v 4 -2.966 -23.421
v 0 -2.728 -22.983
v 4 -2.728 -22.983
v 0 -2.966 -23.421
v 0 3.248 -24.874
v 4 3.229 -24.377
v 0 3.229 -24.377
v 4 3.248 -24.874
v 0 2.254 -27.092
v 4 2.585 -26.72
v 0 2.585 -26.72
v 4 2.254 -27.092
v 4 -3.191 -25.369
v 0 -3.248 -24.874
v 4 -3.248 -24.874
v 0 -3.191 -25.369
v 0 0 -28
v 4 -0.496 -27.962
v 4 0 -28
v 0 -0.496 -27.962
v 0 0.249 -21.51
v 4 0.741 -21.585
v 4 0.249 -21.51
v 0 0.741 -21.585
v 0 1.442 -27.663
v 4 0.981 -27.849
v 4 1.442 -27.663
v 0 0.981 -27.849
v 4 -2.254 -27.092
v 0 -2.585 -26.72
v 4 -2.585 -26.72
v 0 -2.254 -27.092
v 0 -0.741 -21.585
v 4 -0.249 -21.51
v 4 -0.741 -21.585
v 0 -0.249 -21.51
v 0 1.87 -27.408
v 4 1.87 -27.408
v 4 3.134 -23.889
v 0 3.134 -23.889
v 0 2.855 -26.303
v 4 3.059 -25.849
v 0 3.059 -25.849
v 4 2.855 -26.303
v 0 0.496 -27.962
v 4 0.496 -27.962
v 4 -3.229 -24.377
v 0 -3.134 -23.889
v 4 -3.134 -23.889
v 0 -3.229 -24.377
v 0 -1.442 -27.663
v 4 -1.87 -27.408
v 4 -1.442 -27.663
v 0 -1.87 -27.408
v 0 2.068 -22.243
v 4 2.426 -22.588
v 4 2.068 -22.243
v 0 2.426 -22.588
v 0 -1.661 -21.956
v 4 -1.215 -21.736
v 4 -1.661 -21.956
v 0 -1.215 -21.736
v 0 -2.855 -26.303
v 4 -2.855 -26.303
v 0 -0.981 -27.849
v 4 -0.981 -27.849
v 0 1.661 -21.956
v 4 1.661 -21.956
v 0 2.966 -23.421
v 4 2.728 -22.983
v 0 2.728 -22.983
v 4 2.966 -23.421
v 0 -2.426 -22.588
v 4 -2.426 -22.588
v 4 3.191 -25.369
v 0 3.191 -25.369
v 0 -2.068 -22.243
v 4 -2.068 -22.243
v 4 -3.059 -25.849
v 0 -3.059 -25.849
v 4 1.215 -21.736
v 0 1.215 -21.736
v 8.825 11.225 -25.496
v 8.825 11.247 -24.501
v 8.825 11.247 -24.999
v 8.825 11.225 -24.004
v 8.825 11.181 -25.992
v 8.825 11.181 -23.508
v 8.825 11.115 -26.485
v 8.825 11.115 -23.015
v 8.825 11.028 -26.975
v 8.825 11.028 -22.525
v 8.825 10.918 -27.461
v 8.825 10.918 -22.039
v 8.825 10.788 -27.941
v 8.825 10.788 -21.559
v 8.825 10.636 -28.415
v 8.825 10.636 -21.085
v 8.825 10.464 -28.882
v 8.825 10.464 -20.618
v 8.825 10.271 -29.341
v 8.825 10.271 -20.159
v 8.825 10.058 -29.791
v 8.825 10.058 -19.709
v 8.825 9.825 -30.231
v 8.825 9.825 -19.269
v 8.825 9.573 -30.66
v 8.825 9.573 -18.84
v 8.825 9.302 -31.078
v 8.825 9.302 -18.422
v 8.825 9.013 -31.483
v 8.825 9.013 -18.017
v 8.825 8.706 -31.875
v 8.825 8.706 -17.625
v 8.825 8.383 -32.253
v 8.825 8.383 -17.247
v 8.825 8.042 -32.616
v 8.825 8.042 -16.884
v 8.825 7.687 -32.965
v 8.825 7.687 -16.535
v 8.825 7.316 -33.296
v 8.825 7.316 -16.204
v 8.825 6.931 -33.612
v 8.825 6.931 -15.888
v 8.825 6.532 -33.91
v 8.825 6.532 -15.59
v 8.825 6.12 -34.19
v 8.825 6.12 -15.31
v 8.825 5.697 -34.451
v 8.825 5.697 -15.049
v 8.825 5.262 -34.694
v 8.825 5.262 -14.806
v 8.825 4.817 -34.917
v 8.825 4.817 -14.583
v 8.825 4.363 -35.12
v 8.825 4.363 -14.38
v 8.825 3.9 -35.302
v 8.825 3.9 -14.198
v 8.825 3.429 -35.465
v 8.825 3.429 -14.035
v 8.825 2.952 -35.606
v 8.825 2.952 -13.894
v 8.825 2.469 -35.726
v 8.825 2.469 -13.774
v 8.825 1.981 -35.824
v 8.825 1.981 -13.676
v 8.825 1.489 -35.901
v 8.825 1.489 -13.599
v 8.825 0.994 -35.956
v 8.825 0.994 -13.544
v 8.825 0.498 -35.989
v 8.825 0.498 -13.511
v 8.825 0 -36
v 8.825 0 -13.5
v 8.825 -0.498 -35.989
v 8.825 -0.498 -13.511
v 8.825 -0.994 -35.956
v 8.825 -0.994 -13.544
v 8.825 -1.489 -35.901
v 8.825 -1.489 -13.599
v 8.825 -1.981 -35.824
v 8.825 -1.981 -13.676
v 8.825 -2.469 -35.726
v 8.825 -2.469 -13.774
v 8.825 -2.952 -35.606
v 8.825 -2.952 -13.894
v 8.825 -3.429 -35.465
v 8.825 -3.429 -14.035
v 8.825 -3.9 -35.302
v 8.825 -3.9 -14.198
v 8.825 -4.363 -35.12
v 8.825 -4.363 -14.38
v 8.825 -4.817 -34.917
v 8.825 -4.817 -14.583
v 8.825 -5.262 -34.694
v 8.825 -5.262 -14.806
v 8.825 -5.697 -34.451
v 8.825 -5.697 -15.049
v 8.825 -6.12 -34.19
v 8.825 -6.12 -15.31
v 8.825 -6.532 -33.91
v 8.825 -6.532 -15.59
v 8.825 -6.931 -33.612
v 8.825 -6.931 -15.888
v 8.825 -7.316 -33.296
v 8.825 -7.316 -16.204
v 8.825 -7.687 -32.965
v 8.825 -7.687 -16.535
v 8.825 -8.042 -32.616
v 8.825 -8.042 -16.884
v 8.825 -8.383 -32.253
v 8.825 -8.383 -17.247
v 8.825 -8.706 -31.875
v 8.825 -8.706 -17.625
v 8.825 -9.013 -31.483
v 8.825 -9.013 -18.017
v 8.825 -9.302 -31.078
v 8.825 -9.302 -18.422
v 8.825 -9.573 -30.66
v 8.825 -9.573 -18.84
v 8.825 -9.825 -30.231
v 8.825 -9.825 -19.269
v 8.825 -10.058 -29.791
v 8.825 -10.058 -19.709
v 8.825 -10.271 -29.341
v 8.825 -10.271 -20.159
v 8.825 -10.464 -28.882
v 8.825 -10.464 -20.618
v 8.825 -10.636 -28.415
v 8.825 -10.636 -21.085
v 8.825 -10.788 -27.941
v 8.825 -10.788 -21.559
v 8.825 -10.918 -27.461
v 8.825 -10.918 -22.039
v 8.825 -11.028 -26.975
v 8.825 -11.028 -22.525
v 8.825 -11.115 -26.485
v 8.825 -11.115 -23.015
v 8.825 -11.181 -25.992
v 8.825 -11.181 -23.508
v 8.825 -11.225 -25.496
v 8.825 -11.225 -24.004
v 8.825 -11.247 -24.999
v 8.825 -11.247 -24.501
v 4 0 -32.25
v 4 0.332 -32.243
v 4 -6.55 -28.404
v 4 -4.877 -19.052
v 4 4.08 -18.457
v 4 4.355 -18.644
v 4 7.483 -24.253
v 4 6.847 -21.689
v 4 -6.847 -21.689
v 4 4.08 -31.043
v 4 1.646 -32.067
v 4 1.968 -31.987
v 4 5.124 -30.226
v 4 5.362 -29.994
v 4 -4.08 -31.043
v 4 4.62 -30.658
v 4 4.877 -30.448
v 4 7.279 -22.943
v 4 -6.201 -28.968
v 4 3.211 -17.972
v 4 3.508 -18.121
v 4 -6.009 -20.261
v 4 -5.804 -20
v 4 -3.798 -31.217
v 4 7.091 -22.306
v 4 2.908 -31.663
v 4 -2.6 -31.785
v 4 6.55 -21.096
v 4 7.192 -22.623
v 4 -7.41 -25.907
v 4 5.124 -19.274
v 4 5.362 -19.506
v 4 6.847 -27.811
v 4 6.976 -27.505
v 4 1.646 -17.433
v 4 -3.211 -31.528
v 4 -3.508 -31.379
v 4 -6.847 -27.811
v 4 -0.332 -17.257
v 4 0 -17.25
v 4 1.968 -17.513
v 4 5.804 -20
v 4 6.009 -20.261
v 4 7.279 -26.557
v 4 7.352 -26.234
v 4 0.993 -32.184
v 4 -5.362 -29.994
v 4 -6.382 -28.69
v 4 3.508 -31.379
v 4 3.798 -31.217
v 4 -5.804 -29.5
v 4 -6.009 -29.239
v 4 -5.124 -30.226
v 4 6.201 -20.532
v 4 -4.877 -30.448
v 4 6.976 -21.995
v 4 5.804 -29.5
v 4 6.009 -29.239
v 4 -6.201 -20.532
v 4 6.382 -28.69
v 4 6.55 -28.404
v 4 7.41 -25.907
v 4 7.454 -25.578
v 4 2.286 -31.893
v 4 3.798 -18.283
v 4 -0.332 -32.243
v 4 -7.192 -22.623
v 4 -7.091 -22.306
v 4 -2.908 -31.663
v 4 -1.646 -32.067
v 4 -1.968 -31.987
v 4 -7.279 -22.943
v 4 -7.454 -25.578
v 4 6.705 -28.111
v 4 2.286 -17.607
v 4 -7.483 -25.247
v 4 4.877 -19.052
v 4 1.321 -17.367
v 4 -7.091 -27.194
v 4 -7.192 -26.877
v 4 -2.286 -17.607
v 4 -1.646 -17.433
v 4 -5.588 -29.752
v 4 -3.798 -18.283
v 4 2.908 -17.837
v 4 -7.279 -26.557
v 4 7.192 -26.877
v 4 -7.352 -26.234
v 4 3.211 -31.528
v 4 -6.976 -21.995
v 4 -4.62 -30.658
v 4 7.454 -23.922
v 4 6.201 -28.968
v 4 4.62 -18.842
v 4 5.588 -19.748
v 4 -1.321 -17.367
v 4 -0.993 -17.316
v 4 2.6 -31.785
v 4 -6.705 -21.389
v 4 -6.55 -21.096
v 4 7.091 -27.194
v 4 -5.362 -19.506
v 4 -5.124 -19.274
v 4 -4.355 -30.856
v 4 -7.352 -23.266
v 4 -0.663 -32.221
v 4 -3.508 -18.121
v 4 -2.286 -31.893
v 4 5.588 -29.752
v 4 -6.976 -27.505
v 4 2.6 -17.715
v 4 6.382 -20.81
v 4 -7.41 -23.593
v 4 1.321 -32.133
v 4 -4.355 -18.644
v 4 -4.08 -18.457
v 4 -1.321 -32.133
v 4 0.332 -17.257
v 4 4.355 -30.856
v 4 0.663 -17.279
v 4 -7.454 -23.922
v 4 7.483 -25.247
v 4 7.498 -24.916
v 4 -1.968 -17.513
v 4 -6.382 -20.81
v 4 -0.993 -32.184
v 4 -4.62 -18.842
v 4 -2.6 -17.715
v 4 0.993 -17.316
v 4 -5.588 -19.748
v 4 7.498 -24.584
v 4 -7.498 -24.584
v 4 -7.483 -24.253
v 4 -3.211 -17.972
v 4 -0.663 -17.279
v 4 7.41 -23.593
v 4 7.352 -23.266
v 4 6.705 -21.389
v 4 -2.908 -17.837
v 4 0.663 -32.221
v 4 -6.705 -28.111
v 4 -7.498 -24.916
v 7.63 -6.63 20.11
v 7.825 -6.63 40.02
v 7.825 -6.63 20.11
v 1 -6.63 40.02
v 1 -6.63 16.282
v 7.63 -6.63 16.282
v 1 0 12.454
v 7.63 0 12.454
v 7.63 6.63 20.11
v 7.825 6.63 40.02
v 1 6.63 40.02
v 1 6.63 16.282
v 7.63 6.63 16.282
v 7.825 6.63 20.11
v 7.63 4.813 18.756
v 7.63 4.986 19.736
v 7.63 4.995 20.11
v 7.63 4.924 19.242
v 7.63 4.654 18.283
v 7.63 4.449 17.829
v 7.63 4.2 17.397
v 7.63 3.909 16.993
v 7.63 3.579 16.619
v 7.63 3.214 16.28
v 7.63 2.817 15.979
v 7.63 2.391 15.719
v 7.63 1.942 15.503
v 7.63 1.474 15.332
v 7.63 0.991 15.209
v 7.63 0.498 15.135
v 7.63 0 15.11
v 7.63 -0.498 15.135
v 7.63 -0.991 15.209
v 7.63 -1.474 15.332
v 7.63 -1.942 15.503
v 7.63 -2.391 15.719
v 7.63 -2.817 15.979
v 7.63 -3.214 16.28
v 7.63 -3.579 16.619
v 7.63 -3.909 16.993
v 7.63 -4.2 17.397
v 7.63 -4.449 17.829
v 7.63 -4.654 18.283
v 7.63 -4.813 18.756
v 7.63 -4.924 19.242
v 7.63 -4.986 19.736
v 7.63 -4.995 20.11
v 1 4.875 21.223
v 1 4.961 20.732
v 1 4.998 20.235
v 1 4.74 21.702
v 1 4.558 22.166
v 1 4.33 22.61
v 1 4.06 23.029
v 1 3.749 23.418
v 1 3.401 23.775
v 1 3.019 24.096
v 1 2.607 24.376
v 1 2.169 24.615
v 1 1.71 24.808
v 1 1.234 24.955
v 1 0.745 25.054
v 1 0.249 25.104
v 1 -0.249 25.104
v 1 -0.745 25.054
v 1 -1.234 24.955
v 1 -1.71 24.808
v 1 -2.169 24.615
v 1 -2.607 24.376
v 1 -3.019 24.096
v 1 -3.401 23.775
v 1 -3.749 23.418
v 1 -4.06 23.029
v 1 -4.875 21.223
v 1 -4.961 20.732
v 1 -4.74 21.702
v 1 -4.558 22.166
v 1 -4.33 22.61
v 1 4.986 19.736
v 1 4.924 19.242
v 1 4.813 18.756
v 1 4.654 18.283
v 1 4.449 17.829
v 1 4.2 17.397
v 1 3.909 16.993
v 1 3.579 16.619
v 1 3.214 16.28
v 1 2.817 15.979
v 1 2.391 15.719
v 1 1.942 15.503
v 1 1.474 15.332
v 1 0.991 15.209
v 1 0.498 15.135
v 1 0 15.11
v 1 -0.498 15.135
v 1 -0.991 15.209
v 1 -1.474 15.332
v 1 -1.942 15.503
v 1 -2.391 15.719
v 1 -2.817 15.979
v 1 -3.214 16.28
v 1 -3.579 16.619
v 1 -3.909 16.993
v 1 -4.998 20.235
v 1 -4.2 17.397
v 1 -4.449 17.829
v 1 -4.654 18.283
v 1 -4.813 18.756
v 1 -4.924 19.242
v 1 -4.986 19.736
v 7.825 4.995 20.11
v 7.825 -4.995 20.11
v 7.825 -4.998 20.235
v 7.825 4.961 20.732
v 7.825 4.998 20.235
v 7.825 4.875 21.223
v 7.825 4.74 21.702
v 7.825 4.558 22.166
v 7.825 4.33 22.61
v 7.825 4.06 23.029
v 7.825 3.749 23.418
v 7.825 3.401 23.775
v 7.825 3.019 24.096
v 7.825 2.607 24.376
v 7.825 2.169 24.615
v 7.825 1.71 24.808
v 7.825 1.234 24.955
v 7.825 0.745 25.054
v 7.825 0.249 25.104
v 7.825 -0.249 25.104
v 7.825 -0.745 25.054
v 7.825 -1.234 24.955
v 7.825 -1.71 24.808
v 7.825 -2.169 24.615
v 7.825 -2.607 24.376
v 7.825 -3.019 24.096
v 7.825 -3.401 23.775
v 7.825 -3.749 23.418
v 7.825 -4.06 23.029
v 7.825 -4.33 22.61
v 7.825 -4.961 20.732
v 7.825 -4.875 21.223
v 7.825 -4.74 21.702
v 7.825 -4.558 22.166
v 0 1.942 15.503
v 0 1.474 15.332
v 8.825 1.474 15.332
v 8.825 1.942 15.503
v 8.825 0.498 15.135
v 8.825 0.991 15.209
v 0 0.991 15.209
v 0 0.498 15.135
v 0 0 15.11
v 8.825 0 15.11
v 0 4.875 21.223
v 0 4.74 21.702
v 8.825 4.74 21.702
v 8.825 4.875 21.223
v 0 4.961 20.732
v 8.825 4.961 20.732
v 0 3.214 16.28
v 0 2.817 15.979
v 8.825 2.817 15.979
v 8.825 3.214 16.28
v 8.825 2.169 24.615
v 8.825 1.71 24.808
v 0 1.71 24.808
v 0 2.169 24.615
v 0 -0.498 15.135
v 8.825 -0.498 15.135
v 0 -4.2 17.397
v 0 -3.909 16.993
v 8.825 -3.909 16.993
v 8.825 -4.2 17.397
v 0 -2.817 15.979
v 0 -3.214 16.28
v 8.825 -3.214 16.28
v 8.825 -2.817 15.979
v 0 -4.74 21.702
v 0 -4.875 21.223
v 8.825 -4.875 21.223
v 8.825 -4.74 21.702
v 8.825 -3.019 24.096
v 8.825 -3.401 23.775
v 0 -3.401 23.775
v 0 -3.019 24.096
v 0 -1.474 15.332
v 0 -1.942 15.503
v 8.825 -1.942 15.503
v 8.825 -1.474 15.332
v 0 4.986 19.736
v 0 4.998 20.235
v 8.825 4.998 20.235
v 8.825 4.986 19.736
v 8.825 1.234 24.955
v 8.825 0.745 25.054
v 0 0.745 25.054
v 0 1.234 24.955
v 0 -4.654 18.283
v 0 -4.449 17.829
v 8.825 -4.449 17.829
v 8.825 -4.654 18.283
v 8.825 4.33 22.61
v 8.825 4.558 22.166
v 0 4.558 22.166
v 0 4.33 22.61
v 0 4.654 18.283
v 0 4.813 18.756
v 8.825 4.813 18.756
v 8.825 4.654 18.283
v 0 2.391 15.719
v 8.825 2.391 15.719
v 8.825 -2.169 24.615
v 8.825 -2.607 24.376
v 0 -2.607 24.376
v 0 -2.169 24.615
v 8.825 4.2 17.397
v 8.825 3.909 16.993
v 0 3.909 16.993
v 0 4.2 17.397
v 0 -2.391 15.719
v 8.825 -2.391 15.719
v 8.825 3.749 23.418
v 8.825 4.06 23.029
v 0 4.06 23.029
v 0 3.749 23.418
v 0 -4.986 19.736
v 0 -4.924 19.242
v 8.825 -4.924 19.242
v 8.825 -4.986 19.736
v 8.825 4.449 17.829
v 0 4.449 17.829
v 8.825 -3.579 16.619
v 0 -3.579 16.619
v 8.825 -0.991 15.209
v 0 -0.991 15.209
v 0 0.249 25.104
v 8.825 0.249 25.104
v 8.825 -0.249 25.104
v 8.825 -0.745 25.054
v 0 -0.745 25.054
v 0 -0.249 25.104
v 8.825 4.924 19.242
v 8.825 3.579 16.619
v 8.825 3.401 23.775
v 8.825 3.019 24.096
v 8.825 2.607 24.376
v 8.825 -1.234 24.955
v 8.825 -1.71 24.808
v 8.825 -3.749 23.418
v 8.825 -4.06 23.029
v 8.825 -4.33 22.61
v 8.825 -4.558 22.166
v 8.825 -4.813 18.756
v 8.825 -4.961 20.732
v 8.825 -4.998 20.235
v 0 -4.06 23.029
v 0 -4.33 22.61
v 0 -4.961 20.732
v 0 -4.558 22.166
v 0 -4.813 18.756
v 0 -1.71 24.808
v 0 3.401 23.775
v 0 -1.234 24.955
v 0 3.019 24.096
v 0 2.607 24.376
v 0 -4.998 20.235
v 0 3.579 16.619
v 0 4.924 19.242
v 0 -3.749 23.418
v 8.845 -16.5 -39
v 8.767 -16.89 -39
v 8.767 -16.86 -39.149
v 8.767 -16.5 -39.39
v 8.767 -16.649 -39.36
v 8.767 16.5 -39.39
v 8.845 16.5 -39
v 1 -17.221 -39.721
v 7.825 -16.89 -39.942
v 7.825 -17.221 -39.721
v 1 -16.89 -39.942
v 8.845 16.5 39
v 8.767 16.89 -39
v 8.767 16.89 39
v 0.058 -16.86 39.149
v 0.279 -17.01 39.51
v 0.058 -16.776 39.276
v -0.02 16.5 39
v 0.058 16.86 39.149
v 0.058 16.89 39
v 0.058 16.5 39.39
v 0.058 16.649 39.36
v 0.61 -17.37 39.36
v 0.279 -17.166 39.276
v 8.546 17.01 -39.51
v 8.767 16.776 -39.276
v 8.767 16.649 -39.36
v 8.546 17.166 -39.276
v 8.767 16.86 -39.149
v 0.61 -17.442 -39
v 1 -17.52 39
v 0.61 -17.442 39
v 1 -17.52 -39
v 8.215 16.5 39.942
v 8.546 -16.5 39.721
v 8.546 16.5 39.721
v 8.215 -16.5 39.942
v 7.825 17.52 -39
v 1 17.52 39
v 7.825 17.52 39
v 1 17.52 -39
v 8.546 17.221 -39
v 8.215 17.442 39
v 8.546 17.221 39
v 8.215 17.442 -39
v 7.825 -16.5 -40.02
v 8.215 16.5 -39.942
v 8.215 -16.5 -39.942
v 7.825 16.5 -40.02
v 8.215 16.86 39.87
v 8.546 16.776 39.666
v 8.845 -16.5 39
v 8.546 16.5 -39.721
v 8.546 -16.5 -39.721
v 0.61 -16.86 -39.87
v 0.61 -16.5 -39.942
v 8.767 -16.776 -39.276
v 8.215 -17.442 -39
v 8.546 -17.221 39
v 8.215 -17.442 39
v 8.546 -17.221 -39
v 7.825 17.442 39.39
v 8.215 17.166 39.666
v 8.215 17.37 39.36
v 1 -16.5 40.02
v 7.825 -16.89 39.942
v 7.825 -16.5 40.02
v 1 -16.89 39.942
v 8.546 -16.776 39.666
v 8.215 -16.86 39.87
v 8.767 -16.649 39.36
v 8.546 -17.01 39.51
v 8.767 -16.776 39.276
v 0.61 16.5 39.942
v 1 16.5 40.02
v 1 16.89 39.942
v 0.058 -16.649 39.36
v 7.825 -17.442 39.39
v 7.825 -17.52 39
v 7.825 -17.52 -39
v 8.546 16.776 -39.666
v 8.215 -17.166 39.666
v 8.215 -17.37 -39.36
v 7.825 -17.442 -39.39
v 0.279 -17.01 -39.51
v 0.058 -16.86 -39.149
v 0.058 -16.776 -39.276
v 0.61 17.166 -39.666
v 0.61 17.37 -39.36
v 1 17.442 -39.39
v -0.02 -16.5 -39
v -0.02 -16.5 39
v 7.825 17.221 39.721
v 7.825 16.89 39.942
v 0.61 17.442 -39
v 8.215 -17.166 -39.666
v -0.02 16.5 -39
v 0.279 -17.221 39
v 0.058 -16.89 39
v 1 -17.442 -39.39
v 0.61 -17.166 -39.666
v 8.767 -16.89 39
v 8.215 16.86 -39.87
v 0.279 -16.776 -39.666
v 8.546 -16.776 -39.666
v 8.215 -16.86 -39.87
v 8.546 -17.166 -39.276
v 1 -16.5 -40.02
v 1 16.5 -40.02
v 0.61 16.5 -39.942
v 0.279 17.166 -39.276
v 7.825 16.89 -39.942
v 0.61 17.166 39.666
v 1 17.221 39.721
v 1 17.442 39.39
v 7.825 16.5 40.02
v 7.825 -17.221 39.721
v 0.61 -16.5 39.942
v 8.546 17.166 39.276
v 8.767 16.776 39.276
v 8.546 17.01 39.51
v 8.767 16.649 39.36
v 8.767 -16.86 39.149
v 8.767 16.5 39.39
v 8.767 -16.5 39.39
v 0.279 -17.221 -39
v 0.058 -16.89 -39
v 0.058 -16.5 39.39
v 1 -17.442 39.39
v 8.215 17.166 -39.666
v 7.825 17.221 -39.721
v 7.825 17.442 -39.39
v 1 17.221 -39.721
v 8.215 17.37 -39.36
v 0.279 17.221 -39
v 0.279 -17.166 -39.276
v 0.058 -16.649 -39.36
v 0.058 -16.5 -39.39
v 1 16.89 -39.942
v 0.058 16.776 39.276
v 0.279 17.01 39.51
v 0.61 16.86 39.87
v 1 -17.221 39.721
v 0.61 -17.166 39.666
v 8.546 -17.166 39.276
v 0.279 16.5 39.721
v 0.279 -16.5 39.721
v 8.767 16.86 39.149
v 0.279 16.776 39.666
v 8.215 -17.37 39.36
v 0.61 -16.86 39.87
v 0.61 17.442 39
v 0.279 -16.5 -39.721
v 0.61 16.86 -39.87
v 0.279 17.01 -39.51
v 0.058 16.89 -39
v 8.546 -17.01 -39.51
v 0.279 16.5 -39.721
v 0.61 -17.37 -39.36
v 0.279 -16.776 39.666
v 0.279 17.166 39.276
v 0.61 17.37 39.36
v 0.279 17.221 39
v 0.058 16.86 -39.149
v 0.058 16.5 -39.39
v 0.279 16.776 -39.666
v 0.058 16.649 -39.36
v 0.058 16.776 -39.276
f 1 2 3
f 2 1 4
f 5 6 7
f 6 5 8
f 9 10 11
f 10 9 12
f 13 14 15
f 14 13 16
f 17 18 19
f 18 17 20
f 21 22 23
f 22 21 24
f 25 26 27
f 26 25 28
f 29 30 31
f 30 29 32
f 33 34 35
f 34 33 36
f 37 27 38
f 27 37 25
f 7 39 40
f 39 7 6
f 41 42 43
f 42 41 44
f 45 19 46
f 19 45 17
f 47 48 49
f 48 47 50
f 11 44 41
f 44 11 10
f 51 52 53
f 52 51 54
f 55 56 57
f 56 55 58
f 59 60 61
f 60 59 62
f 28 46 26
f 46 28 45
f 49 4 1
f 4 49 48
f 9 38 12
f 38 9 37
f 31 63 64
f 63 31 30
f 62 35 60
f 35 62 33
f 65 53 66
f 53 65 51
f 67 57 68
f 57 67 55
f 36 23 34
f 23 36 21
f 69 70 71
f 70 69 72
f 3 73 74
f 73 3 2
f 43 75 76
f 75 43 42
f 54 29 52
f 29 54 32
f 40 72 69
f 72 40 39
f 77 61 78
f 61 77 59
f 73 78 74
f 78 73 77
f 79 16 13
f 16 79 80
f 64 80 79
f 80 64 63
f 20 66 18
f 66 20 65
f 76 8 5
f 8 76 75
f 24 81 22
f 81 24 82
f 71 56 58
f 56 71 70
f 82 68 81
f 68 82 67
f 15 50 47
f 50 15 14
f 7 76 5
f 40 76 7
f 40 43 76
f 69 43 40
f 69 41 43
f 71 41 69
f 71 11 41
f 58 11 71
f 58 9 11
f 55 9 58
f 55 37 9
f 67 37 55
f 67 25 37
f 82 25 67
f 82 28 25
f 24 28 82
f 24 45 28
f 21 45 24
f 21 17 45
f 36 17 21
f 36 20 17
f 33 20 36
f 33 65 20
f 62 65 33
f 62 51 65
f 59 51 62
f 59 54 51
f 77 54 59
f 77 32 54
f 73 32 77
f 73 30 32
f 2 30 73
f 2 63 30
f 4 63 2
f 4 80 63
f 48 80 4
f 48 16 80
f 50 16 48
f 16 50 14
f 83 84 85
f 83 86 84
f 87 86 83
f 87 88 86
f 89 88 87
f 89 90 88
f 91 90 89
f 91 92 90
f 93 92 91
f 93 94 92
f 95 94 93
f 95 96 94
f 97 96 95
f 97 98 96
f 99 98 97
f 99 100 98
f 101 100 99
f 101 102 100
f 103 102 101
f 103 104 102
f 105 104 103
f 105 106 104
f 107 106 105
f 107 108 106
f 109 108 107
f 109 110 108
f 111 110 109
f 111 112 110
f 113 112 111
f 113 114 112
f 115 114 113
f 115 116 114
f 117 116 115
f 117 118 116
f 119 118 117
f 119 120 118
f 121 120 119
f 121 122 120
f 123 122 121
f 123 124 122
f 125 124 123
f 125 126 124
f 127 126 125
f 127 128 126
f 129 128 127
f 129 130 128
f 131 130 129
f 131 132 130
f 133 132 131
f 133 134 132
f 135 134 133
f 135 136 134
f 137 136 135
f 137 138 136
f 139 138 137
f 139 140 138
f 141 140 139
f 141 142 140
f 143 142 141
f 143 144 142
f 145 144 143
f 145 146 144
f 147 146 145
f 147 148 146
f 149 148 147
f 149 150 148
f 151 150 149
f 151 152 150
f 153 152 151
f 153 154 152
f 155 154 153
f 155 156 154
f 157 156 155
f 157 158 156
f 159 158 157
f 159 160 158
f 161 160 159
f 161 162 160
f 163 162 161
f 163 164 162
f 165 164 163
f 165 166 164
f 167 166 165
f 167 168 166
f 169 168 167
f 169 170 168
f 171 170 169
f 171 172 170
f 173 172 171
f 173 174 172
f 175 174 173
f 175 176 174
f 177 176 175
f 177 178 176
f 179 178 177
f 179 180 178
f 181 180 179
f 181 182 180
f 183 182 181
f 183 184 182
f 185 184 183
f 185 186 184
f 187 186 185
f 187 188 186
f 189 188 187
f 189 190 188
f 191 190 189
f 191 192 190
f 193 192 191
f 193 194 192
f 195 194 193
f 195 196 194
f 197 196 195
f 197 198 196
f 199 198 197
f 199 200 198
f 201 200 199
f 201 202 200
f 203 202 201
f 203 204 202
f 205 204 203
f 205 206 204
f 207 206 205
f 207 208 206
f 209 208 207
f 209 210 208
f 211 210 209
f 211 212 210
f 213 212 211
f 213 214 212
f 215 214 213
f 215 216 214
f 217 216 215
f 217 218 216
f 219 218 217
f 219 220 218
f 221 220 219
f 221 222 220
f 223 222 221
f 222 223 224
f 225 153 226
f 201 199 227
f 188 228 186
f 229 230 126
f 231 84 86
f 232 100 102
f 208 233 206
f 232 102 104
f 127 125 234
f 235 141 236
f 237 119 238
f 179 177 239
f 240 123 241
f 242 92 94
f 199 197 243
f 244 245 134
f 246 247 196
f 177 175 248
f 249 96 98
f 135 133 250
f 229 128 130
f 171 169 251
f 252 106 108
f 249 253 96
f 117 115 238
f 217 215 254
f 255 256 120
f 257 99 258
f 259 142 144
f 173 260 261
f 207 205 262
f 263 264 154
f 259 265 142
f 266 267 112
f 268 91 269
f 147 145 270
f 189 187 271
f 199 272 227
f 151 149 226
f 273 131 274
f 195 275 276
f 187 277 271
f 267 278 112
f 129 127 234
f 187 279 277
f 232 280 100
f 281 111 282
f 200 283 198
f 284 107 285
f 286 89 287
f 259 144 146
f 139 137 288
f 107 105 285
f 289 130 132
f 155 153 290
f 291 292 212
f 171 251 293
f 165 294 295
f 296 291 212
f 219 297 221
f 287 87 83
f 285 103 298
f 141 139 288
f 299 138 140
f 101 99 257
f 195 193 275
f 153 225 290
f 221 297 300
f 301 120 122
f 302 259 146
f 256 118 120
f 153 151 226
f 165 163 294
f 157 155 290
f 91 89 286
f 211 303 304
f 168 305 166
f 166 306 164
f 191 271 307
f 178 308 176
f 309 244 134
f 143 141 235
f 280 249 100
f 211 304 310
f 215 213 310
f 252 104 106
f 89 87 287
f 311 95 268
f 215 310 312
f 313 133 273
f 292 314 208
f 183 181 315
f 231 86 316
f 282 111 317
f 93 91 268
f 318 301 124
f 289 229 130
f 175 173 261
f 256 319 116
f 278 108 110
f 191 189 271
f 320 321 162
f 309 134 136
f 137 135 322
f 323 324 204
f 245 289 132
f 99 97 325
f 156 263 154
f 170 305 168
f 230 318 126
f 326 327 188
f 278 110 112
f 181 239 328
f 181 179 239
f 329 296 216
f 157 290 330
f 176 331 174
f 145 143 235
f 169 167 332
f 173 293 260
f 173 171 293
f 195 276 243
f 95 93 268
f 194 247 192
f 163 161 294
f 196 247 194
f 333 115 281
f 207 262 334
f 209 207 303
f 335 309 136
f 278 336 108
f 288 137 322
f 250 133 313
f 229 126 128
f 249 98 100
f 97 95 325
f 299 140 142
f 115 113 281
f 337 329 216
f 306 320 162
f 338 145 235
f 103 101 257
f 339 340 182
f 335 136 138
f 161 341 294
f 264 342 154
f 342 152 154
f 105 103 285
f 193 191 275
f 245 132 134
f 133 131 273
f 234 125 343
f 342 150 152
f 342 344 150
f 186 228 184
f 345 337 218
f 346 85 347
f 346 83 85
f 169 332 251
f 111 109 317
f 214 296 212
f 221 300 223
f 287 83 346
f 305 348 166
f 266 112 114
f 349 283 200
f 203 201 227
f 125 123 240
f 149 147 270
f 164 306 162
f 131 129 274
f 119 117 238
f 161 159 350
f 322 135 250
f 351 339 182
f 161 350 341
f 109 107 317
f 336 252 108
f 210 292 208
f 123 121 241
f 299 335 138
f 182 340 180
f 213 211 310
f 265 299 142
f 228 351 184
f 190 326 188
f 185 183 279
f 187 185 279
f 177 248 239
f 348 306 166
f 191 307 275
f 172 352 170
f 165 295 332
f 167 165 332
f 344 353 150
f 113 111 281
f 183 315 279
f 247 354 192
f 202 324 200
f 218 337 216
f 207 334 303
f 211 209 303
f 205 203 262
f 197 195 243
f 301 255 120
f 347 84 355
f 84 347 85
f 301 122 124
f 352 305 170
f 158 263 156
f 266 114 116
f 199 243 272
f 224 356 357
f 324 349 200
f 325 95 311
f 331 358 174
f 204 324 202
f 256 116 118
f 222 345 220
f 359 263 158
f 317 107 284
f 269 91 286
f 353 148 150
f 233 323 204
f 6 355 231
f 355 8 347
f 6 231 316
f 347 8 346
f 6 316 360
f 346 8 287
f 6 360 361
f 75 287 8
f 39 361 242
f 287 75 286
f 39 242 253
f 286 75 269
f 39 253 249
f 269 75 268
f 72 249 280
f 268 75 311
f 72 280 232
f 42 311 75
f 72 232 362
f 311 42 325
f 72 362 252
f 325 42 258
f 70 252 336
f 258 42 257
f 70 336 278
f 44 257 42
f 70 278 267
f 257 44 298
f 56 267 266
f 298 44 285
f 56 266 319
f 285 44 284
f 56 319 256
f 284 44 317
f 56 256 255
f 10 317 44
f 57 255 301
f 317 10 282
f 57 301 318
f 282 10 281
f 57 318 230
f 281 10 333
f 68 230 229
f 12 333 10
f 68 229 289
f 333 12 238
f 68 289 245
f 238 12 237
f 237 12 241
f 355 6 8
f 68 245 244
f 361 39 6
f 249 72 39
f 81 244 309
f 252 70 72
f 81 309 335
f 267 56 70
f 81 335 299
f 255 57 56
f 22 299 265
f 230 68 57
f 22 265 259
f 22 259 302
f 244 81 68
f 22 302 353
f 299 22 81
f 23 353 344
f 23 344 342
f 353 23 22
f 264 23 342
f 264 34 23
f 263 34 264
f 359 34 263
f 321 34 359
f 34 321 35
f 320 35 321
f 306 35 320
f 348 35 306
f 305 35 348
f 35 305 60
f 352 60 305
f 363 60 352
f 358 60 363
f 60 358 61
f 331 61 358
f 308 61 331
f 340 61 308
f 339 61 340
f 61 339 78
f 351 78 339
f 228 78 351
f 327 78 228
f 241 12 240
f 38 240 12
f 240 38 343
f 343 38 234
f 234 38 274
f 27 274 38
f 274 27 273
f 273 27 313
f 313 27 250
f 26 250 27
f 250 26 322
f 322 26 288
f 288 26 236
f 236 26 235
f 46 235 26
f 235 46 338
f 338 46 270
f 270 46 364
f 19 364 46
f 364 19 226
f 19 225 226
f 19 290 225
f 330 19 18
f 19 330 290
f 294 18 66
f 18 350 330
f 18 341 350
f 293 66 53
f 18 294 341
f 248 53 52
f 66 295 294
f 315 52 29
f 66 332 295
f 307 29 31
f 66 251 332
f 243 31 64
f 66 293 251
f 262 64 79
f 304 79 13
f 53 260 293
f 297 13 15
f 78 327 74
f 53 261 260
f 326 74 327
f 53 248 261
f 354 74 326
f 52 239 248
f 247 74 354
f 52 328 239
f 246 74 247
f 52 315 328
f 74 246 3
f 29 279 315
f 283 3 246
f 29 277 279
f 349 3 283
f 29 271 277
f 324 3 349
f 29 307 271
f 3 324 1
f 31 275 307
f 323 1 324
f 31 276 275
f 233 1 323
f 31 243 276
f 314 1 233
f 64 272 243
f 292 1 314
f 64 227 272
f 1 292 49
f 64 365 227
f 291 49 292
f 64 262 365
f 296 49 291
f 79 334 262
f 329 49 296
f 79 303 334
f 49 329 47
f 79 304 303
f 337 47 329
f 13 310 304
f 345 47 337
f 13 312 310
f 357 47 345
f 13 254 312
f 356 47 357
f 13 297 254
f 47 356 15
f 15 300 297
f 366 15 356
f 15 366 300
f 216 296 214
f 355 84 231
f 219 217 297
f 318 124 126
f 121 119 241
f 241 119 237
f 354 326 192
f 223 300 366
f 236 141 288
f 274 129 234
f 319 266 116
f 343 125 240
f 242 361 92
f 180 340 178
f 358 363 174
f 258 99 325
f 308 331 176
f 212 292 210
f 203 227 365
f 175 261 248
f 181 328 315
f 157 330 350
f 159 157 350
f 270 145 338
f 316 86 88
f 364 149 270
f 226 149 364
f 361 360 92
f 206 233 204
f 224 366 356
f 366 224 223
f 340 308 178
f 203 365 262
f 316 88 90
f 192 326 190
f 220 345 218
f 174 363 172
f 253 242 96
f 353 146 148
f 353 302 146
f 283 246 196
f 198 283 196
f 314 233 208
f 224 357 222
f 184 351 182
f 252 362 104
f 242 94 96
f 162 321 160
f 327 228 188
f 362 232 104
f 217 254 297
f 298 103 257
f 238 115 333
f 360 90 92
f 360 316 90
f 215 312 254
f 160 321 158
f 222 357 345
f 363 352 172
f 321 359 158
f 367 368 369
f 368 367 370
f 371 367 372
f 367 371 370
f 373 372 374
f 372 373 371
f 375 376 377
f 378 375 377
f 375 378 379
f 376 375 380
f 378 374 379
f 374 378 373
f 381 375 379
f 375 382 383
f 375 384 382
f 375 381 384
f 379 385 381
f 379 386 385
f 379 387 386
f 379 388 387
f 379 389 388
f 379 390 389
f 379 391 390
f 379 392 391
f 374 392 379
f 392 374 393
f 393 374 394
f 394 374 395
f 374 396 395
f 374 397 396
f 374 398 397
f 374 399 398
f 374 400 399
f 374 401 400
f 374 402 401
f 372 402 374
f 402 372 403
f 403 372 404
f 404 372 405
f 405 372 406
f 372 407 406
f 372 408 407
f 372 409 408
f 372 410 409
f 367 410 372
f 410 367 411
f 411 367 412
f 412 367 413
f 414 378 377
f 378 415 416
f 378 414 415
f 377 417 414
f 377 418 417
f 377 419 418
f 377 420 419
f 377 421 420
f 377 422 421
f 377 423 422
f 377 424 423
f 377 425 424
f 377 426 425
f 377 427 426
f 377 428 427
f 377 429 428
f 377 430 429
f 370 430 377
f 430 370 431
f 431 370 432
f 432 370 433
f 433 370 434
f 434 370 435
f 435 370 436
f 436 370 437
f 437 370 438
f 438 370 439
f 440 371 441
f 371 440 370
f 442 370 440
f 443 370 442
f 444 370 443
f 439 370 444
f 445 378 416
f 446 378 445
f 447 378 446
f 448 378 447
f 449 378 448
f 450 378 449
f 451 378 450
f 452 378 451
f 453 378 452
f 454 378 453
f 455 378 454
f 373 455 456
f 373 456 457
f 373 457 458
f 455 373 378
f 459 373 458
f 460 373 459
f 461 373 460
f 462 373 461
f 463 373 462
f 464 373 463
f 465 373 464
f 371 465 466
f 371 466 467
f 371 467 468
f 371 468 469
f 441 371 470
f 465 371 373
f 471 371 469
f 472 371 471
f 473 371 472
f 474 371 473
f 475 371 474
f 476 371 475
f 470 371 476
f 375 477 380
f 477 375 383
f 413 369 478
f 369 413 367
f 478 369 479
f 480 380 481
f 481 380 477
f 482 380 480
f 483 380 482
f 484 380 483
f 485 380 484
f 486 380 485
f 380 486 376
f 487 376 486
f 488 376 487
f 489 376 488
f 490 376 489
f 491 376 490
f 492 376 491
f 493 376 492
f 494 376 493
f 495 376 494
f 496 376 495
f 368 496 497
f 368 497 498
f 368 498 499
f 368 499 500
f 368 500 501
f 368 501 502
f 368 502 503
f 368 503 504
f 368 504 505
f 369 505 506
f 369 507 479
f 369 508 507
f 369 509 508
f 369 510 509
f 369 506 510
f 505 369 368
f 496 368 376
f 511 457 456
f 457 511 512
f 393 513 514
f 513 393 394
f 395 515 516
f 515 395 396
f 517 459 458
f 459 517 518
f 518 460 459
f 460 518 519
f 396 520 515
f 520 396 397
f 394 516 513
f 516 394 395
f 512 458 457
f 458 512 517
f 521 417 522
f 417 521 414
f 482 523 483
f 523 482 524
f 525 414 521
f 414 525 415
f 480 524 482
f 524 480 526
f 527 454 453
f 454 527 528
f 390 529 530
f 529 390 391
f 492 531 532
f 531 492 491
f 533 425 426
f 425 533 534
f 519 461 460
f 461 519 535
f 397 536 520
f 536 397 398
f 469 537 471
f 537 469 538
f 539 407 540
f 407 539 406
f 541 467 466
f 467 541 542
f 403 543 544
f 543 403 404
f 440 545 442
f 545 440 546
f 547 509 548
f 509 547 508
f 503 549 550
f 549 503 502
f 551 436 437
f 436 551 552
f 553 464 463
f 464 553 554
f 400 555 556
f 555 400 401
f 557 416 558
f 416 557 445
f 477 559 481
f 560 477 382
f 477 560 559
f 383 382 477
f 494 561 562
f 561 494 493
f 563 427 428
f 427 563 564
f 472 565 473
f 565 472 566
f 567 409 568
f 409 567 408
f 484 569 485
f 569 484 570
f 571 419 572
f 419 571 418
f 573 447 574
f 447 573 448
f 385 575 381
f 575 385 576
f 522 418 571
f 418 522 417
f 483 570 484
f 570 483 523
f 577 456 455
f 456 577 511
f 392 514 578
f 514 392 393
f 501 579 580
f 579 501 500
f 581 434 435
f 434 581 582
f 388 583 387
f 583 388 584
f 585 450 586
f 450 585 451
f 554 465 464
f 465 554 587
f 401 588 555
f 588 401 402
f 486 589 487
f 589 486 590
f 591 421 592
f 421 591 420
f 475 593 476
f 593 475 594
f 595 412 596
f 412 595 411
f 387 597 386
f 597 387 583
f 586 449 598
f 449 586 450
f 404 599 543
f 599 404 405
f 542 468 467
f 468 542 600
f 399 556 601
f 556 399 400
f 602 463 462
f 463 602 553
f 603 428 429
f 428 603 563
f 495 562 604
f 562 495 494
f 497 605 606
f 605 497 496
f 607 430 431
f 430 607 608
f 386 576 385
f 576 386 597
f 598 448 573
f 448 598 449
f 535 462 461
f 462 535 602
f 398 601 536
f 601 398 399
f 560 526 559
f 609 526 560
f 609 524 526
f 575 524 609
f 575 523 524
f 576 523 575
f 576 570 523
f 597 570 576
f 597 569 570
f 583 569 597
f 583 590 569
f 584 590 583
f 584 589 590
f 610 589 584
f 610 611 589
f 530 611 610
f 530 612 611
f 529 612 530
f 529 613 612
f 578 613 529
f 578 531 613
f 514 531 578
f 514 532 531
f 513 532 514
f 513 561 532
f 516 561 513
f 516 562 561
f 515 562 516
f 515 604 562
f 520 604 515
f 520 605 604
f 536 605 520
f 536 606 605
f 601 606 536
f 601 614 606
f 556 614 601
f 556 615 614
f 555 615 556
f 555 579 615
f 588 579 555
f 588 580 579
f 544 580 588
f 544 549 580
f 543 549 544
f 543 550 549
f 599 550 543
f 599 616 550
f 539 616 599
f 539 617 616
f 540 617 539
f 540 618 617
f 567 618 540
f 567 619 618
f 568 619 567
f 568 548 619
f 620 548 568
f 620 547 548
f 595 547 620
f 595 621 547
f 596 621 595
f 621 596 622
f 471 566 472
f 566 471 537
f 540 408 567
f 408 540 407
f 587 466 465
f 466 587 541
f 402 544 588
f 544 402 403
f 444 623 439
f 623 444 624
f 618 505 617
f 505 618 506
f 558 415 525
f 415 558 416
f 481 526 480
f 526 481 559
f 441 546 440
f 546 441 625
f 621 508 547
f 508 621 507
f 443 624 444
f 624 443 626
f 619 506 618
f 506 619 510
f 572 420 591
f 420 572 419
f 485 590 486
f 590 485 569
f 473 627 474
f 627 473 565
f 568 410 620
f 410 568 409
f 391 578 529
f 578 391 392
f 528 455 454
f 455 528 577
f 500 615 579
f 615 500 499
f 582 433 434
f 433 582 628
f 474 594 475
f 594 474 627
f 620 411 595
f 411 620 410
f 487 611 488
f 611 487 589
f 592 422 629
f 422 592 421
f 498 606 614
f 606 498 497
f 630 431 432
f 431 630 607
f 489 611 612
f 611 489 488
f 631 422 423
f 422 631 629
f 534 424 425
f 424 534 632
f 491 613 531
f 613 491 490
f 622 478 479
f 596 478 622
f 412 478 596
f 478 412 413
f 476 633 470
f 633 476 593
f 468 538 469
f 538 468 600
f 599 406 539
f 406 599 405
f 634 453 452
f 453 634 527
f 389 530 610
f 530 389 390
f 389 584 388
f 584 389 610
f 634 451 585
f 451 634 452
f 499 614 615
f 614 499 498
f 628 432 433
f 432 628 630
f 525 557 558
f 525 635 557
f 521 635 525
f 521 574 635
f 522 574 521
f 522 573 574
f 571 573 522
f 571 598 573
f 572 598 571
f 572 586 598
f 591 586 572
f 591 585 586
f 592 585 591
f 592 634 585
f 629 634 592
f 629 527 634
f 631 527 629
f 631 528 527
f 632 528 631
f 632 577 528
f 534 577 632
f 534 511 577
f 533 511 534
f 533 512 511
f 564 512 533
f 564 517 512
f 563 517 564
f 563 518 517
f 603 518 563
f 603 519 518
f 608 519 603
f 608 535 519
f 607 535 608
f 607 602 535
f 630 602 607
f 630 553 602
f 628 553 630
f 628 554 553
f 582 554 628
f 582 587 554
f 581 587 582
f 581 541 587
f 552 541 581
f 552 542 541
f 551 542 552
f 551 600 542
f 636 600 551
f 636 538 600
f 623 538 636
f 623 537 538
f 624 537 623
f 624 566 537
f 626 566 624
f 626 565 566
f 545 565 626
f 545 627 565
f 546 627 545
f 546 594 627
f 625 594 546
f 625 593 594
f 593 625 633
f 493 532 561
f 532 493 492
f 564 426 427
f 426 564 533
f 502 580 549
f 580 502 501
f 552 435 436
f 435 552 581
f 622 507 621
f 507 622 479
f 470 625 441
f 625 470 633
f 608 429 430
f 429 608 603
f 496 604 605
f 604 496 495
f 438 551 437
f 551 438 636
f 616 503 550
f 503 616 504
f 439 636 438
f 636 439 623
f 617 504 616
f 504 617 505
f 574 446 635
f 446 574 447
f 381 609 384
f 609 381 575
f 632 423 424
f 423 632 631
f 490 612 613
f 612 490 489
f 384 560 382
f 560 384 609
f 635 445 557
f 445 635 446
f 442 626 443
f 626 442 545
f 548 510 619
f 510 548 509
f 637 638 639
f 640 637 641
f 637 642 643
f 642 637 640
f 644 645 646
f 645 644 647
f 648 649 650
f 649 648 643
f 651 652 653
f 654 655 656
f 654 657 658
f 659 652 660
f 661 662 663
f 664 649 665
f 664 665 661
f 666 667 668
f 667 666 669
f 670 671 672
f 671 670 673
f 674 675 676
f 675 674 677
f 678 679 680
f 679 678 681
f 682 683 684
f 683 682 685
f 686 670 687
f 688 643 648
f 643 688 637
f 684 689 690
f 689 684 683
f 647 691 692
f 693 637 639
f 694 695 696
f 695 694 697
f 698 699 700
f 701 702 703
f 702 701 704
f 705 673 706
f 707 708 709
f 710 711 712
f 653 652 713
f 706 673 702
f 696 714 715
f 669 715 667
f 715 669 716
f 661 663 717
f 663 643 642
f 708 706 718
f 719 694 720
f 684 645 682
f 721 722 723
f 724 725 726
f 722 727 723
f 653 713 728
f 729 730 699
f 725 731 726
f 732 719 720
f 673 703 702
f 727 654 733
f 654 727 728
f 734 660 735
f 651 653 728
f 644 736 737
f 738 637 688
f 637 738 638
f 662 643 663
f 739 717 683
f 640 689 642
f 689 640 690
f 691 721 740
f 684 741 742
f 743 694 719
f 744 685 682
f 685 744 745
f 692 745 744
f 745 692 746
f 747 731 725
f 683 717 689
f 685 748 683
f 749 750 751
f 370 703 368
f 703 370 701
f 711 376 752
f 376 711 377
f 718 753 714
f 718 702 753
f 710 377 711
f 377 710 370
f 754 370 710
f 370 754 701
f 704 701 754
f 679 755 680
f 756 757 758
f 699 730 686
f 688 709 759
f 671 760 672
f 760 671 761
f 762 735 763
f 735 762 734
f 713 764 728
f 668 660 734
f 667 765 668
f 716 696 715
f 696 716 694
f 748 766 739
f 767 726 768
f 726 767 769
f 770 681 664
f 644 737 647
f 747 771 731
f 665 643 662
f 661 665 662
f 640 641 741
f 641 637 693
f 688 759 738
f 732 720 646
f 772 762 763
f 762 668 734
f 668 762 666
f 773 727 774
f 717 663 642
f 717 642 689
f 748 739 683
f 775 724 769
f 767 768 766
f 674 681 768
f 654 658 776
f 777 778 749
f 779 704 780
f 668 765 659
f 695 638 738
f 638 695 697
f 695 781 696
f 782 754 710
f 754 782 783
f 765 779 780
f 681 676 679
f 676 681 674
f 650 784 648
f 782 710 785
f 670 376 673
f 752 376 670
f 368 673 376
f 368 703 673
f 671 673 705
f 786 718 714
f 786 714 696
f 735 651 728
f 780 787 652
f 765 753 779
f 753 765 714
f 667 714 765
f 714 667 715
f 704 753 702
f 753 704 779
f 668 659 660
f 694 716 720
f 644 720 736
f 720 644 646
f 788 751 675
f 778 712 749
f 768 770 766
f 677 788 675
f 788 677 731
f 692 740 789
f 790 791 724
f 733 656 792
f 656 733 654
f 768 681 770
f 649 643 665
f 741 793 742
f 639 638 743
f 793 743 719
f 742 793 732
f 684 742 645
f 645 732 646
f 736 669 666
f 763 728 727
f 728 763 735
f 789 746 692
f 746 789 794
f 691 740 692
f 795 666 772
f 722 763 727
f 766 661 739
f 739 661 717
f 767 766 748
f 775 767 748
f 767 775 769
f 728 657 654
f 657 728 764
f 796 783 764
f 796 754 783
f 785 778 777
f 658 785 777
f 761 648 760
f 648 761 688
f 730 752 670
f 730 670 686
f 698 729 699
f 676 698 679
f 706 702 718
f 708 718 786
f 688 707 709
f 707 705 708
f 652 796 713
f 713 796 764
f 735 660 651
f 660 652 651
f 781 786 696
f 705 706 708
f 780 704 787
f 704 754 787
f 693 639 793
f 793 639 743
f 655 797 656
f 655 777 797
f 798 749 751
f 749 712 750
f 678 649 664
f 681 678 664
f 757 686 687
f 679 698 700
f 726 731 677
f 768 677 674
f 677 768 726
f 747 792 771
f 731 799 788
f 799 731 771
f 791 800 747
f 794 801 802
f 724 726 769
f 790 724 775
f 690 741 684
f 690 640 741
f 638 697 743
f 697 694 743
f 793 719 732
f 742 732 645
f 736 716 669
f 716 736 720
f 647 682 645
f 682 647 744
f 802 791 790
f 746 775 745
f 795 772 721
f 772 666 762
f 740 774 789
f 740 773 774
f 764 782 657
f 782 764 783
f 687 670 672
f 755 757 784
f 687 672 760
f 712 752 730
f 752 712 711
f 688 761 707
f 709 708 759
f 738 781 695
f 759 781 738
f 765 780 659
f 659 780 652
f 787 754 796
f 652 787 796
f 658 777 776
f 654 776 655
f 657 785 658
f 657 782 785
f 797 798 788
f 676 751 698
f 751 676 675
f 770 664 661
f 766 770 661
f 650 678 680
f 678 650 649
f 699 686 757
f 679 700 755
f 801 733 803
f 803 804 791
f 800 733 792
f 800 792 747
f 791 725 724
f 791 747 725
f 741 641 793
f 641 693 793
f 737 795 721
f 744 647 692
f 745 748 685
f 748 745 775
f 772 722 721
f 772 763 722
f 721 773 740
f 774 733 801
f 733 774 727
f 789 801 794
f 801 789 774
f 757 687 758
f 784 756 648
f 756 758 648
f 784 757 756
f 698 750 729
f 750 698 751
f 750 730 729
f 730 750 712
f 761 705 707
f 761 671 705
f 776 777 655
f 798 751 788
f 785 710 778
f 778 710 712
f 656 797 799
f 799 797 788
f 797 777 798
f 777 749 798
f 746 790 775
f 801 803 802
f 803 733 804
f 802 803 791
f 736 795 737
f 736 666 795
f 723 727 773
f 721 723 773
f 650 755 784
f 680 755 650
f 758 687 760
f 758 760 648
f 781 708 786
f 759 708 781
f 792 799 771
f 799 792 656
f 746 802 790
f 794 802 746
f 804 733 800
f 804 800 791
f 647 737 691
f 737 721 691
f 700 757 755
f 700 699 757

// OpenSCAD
include <BOSL/metric_screws.scad>
include <BOSL/shapes.scad>
include <BOSL/transforms.scad>

rod=8;

_gmnt = get_metric_nut_thickness(size=rod) * 1.05;
_gmns = get_metric_nut_size(size=rod) * 1.02;

thick=_gmnt + 2;
l=80;
w=35;

cam_screw_hole=6.5;
cam_screw_depth=4;
cam_screw_head_dia=15;

// Rendering values
$fa=1;
//$fs=2;    // Drafting quality
$fs=0.5;    // Finish quality

rotate([0, 90, 0]) {  // The bridges are better "vertical" though a brim may be needed
    difference() {
        cuboid([l, w, thick], fillet=1, align=V_UP);
        
        // Camera screw hole
        _d2 = cam_screw_head_dia * 1.5;
        translate([(l/2) - (_d2/2) - 4, 0, 0]) {
            cyl(d=cam_screw_hole, h=thick, align=V_UP);
            translate([0, 0, cam_screw_depth])
                cyl(d1=cam_screw_head_dia, d2=_d2, h= thick - cam_screw_depth, align=V_UP);
        }
        
        // Rod hole
        translate([(-l/2)+ (_gmns*1.5), 0, 0]) {
            // Rod hole
            cyl(d=rod*1.25, h=thick, align=V_UP);
            // Nut outline
            translate([0, 0, (thick/2) - (_gmnt/2)]) {
                // Nut
                scale(1.02)
                    metric_nut(size=rod, hole=false);
                // Nut instert slot
                translate([-l*0.125, 0, 0])
                    cuboid([l*0.25, _gmns, _gmnt], align=V_UP);
            }
        }
    }
}
